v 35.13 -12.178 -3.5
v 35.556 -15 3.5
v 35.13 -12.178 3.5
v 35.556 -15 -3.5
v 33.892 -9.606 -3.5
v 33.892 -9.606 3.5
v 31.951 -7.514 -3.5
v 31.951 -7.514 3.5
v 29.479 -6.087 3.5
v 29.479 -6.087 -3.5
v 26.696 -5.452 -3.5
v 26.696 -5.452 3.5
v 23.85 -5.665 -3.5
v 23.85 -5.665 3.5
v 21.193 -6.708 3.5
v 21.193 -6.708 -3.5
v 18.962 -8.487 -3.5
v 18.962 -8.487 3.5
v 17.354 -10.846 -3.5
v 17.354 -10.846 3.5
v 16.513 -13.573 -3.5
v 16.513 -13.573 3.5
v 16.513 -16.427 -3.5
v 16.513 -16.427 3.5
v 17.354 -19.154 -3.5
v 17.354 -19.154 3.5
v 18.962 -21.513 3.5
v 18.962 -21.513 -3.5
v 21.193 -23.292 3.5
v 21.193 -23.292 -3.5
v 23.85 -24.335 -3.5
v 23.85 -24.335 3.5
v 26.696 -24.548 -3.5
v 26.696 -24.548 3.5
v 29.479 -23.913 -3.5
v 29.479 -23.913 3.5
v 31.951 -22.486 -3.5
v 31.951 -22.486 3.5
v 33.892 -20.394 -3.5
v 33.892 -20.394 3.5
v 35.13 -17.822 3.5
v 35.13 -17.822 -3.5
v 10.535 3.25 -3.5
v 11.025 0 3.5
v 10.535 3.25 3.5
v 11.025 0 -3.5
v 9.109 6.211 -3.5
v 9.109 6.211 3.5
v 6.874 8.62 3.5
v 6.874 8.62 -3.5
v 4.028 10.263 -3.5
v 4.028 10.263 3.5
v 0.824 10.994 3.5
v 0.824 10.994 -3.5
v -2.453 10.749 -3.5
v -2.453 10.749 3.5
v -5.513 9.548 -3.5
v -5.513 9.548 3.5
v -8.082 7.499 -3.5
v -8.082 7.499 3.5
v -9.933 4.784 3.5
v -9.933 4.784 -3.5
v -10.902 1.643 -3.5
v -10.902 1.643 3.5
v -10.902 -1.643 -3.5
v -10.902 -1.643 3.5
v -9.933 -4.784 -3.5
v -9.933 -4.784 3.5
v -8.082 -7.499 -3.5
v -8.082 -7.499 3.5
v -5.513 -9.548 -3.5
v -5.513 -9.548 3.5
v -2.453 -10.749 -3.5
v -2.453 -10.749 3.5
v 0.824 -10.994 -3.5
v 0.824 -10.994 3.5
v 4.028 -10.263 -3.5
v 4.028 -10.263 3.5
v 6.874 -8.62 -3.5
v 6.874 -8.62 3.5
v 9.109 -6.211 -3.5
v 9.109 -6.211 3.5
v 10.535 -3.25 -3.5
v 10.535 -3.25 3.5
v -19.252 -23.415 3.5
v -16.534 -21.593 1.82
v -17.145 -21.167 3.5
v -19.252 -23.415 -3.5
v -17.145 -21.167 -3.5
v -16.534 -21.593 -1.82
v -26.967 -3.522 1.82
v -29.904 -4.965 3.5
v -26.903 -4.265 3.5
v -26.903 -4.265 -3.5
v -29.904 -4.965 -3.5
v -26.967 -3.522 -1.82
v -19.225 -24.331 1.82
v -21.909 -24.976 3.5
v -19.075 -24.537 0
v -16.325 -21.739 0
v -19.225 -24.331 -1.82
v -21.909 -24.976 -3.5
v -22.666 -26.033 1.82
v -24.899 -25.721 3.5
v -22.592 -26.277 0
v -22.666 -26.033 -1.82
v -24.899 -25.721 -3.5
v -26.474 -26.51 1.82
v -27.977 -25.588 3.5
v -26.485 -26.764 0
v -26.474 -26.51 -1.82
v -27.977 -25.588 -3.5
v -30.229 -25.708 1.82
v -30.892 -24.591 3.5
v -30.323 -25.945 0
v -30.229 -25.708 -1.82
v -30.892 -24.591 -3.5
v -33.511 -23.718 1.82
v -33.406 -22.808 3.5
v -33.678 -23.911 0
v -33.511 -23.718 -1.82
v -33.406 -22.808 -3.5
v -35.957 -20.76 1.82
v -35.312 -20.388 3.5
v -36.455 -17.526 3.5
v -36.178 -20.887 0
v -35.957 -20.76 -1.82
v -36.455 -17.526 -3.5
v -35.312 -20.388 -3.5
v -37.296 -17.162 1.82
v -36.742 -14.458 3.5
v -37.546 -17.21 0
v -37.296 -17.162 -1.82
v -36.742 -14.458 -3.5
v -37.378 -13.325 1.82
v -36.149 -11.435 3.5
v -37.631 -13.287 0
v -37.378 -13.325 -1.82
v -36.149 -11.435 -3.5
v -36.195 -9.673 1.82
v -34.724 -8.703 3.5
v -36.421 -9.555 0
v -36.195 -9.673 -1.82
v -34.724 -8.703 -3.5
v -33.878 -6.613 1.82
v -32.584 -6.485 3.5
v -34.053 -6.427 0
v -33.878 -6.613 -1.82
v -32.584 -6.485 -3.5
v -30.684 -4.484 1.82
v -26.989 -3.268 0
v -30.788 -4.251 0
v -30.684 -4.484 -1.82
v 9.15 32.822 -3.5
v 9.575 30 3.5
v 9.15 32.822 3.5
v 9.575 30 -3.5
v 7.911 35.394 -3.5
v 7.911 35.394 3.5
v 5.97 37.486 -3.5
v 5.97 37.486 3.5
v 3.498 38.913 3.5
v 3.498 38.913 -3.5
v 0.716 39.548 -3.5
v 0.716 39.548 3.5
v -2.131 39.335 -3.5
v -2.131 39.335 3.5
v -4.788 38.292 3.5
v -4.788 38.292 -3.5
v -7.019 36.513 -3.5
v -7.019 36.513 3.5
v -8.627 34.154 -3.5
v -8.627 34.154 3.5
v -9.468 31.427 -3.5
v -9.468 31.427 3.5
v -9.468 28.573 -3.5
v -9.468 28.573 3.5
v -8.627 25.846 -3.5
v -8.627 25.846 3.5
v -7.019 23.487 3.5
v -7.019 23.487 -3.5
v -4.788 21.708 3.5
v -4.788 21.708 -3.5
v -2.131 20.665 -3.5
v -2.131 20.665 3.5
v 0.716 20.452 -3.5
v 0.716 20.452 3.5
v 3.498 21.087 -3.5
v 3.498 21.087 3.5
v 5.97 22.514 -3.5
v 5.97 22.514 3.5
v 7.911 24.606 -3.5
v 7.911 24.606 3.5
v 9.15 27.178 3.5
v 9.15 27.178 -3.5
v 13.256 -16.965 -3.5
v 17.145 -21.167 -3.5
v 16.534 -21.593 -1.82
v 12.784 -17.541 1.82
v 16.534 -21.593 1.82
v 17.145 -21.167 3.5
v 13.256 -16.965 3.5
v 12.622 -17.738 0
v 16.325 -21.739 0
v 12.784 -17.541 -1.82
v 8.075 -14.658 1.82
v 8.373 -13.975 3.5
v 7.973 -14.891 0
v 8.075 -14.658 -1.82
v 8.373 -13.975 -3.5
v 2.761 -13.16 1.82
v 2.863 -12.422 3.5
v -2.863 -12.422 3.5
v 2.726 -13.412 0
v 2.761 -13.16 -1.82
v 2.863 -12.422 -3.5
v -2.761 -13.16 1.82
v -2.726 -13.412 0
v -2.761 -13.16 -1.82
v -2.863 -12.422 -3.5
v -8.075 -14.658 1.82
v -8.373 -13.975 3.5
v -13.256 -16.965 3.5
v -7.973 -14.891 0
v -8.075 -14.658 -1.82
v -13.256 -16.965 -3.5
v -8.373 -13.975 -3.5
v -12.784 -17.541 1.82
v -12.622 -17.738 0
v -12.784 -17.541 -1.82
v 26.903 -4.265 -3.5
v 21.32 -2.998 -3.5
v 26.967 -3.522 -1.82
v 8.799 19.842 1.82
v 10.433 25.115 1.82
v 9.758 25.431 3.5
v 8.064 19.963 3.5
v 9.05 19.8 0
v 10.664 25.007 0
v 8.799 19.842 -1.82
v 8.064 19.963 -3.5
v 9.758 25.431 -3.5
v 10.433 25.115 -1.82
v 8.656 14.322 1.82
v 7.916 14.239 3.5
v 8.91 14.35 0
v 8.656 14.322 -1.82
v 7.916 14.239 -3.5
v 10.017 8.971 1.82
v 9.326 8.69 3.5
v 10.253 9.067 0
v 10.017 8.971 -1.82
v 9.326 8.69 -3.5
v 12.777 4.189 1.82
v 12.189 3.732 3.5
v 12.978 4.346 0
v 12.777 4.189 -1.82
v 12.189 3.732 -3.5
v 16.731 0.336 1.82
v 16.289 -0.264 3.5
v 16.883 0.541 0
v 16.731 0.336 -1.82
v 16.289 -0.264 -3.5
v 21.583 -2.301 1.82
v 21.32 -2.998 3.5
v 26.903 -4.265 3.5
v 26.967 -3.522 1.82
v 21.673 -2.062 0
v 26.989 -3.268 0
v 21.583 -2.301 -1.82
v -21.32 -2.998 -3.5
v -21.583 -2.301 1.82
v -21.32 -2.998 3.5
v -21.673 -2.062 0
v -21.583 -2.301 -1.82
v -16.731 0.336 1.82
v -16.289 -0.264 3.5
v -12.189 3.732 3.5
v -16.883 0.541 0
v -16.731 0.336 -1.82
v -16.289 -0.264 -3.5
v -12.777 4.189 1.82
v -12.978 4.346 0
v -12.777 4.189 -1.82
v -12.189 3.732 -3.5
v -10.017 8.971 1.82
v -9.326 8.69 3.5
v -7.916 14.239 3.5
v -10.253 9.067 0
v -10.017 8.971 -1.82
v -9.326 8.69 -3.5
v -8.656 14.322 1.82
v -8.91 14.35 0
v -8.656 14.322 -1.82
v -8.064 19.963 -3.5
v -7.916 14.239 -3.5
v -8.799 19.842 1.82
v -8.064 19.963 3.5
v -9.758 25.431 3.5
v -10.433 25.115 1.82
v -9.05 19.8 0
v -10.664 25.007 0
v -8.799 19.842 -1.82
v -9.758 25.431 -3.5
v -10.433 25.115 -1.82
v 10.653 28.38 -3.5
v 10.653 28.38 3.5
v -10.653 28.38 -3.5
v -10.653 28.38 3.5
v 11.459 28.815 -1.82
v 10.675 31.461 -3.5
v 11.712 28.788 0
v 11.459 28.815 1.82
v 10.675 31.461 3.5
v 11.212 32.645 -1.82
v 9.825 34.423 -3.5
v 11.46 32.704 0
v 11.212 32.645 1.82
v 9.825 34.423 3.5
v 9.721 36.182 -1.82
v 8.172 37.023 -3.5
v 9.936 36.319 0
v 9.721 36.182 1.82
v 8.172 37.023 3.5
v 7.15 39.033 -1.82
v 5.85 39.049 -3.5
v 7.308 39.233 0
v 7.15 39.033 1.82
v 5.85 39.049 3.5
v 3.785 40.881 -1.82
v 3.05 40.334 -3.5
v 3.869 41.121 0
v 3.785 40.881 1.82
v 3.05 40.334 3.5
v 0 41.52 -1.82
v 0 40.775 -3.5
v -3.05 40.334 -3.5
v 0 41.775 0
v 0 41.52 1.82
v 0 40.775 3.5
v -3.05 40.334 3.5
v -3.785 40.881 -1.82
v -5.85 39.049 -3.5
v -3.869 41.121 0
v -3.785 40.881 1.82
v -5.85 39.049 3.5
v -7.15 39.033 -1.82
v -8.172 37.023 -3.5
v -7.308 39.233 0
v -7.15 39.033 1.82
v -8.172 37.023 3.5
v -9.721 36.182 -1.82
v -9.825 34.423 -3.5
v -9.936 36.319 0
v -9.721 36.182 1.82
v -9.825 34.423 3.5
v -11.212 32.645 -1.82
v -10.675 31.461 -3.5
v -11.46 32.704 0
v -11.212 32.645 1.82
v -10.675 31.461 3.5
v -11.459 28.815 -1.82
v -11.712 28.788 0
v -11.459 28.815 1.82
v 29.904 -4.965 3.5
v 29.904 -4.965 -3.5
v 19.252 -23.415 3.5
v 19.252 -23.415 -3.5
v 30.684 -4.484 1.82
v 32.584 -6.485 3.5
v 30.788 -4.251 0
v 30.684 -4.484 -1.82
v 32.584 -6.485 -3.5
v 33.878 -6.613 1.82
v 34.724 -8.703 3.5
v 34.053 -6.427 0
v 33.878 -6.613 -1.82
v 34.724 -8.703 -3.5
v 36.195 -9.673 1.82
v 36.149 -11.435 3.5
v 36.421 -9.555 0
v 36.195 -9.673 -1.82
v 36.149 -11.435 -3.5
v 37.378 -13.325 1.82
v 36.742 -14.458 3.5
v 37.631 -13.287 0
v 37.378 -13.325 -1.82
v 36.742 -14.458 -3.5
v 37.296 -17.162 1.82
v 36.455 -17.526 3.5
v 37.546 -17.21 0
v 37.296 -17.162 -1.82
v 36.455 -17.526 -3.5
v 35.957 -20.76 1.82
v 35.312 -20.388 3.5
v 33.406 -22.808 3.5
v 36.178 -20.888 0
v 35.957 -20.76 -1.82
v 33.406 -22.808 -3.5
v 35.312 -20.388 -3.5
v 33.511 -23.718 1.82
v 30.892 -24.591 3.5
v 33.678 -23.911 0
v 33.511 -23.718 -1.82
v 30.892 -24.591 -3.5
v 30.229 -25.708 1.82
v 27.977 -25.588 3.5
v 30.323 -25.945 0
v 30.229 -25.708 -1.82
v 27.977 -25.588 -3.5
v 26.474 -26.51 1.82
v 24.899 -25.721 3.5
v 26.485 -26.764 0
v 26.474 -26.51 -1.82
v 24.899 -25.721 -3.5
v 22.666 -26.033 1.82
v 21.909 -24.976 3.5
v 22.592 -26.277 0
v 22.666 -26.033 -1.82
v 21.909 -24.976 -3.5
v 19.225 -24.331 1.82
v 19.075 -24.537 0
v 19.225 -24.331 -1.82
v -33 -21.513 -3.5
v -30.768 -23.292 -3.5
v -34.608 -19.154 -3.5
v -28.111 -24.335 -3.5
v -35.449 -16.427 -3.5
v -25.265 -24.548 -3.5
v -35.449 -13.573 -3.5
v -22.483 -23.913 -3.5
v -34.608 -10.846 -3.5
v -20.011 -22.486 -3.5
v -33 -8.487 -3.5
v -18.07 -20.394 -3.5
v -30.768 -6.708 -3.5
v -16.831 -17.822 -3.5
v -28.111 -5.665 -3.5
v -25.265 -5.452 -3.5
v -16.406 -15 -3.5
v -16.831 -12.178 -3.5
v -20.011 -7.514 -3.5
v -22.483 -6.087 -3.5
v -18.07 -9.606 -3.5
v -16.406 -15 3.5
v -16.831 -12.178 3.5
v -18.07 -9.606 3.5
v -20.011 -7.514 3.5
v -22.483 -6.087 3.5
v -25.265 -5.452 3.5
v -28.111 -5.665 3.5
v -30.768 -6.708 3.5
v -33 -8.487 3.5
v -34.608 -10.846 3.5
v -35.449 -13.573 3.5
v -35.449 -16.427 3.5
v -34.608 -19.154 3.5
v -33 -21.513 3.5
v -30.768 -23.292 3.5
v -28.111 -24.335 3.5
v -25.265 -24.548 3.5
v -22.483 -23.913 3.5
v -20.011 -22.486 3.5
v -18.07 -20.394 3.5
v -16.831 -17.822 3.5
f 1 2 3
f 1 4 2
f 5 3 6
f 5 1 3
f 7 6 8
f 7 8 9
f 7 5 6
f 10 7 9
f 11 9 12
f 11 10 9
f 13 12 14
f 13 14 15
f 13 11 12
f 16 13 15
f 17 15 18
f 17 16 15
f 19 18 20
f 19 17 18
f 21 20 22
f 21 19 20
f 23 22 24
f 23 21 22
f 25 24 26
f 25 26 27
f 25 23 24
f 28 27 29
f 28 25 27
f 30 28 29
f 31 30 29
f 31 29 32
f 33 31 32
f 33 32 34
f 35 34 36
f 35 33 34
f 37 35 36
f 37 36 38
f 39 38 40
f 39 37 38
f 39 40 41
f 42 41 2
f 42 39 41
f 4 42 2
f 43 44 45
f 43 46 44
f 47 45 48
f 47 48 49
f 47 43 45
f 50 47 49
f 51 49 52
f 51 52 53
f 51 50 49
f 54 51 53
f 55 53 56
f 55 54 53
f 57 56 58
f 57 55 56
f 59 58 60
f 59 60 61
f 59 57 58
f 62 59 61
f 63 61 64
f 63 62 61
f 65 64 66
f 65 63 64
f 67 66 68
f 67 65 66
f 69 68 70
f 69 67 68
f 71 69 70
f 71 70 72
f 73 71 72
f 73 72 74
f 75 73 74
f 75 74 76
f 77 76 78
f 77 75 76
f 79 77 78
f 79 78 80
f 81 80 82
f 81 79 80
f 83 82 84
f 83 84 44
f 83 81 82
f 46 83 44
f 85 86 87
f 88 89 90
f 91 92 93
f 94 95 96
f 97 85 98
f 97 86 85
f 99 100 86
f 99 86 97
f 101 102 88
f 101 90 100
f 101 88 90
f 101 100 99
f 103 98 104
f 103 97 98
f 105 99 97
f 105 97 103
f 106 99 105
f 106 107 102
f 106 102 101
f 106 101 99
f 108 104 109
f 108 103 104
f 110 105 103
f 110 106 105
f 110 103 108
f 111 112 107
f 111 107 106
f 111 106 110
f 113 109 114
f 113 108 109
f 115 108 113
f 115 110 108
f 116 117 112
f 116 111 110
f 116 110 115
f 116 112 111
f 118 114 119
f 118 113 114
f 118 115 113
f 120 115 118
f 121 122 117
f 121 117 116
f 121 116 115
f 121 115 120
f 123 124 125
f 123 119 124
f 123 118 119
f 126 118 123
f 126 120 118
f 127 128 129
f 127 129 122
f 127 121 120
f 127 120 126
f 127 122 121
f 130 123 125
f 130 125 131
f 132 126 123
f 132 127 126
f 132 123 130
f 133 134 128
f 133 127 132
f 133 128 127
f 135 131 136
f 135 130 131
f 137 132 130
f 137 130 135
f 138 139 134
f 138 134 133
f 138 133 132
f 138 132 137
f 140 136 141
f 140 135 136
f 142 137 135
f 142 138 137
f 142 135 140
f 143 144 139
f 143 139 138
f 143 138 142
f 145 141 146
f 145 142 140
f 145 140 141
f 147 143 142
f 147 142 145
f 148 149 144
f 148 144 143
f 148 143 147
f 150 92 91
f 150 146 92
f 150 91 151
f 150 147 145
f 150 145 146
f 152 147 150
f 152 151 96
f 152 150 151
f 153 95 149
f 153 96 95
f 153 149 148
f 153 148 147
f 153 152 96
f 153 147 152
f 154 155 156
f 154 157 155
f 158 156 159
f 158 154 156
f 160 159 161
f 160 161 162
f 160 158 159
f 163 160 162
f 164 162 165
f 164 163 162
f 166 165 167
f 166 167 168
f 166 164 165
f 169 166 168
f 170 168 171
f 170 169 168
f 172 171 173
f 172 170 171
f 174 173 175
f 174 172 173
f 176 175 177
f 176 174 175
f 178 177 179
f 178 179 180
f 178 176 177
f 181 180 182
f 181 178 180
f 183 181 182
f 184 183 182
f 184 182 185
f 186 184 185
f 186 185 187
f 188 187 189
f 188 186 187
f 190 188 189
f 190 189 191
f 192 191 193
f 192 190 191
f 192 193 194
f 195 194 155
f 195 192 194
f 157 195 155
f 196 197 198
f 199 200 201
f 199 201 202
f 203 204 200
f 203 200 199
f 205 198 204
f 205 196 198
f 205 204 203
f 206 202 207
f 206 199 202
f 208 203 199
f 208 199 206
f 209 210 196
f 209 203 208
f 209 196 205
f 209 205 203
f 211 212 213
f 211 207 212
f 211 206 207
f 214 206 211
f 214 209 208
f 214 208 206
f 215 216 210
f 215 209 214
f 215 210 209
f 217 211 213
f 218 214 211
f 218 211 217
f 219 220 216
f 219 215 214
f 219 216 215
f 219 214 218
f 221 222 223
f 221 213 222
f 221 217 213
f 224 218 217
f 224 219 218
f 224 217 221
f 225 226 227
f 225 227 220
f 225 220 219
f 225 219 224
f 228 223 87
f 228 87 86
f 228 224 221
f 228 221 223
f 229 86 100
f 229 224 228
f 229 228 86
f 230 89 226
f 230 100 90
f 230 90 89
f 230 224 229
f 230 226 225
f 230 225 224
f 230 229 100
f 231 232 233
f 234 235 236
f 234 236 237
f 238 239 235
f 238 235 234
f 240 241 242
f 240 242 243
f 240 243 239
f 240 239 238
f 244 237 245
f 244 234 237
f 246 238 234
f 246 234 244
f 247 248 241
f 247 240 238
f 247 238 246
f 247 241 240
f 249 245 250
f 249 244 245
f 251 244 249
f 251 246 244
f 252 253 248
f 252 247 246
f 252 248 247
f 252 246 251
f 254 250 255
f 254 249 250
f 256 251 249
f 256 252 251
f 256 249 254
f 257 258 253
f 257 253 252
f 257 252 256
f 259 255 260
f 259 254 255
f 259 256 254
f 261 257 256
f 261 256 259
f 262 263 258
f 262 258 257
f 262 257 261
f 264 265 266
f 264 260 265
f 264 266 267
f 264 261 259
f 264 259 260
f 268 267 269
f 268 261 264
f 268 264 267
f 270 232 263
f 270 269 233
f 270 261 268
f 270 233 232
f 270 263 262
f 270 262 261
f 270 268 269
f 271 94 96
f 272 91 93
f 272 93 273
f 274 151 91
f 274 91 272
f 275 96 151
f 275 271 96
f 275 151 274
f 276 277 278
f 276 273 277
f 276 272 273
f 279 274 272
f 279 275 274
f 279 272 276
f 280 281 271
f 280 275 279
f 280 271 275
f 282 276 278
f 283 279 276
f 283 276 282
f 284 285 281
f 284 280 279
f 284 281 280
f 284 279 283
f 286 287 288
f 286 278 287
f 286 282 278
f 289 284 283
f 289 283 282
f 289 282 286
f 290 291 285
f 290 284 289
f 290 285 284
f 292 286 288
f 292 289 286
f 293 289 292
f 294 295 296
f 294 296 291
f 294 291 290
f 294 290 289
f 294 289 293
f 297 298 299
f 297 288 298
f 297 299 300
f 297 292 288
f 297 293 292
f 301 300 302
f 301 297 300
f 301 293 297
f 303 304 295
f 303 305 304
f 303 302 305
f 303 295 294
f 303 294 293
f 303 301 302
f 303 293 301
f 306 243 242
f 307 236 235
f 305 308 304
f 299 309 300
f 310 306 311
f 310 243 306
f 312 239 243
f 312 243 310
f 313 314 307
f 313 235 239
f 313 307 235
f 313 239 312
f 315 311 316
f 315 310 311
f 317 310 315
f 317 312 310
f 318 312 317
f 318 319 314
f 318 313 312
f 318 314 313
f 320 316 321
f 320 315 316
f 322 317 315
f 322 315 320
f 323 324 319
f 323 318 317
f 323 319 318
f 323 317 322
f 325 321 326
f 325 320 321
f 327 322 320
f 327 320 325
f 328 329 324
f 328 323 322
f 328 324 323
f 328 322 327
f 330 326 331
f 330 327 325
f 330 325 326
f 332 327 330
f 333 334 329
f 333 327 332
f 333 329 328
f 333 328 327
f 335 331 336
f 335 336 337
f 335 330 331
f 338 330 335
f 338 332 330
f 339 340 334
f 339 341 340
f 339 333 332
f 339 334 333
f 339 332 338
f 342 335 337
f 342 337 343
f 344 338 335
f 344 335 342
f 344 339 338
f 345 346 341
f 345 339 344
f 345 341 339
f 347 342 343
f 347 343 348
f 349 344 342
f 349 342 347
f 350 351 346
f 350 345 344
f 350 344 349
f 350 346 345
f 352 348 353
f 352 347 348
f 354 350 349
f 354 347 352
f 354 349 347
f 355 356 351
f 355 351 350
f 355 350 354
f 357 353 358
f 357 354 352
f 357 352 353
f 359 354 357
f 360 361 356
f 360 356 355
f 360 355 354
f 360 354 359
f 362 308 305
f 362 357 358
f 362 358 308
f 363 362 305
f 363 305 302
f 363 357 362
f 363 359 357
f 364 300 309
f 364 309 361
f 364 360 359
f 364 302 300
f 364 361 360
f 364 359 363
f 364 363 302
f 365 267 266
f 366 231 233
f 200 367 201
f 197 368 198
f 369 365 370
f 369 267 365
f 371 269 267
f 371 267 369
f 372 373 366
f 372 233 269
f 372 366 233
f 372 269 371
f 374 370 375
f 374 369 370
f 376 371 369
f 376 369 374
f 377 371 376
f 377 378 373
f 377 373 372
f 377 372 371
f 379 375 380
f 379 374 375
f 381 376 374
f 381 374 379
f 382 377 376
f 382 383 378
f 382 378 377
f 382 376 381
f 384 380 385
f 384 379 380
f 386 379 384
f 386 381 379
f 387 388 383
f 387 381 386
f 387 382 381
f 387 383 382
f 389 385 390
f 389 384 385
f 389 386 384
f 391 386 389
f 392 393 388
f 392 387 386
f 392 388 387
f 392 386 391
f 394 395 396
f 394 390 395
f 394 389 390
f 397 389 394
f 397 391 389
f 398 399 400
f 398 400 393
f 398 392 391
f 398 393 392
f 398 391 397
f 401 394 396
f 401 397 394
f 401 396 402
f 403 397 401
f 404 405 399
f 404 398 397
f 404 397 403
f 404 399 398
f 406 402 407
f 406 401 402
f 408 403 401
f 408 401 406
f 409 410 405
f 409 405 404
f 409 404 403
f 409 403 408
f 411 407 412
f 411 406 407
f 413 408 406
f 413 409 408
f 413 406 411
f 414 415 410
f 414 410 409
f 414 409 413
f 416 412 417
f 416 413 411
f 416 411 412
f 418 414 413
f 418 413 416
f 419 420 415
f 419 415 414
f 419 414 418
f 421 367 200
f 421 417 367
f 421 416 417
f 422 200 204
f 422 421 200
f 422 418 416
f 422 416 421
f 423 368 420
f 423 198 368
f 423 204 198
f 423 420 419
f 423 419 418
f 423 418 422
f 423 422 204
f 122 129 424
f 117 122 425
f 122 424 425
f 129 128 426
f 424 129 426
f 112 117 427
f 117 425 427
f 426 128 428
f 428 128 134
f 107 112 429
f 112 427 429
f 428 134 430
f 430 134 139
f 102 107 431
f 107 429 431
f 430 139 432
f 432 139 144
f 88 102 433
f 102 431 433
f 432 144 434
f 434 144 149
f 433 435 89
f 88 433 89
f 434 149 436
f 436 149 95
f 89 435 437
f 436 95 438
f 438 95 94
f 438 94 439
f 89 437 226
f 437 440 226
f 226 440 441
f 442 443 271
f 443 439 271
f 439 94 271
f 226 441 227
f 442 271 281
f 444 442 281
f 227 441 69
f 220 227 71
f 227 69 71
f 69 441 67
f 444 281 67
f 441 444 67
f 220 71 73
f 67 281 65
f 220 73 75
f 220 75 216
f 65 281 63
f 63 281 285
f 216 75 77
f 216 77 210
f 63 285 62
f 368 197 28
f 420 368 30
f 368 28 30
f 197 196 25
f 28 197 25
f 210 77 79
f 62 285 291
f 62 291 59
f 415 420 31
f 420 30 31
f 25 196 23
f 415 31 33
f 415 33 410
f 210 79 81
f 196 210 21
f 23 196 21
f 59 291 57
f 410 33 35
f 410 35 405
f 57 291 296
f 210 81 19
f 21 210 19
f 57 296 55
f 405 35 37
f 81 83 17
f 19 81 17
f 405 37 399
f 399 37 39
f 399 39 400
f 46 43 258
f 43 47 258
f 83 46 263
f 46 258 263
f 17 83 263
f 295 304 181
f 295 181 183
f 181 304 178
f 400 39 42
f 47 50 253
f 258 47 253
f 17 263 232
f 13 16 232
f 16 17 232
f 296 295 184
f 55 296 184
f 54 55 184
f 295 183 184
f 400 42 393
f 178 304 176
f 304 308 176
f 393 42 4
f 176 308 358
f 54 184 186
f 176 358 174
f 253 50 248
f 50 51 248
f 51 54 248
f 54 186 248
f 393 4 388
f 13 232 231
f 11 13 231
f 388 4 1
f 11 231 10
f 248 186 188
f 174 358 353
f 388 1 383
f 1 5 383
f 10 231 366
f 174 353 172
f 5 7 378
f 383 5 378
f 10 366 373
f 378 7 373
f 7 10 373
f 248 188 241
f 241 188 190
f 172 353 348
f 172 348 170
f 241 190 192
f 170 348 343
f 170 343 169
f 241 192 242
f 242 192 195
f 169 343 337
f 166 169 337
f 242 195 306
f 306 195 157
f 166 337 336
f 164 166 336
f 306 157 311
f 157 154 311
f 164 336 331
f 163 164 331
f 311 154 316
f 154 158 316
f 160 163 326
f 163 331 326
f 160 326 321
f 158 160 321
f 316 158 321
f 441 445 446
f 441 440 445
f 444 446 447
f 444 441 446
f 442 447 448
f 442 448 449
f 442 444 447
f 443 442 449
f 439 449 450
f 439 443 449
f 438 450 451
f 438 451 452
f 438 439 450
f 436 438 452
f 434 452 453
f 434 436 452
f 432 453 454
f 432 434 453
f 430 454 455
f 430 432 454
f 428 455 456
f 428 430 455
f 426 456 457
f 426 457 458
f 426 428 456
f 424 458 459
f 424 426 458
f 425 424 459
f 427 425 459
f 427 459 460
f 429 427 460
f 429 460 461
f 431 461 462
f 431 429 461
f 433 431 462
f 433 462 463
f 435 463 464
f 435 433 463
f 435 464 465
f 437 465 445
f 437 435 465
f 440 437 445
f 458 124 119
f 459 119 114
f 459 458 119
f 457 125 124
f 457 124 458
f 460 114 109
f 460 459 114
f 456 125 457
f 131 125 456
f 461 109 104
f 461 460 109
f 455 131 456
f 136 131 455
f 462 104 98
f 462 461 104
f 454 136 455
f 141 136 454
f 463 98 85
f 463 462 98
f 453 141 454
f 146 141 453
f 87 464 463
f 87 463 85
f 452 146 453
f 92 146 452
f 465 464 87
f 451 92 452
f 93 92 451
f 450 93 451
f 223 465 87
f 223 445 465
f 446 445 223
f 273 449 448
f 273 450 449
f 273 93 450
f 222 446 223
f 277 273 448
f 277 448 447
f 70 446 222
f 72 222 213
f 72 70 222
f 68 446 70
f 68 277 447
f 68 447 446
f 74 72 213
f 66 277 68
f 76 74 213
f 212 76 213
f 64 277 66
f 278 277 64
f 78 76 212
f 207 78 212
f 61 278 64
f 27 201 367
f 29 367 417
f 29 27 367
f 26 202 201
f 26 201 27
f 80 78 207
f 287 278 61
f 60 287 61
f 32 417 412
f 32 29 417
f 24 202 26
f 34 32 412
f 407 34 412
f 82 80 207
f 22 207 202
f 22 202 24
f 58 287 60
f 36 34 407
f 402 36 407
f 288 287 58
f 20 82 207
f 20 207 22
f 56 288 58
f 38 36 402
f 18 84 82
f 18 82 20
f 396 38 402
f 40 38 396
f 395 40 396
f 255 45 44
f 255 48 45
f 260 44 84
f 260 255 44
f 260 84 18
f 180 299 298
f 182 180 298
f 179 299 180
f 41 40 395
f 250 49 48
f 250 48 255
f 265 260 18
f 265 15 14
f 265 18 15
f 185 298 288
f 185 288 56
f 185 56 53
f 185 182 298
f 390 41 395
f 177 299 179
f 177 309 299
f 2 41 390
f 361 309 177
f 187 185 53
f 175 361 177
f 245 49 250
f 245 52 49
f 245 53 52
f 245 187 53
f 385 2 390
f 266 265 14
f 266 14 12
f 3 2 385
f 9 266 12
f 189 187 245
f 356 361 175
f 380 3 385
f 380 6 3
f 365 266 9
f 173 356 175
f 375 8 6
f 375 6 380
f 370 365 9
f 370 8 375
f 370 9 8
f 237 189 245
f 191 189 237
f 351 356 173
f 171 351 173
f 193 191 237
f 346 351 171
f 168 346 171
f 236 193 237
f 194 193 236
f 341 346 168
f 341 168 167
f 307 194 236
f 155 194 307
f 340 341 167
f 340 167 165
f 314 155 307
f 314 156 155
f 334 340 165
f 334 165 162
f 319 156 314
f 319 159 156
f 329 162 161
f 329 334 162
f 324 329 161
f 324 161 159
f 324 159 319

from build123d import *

# Parameters (mm, degrees)
F0_R     = 9.575
F0_R_2   = 11.025
F1_DEPTH = 3.5


# Not quite as in the source:
# - a feature names something its author has since deleted; it is built from what else it names


with BuildPart() as f1:
    # F0 (on Top) → F1 (new body, symmetric)
    with BuildSketch(Plane.XY):
        with BuildLine():
            ThreePointArc((-9.7584878157, 25.4313524375), (-10.5871605613, 6.1125), (-26.9034411714, -4.2645778678))
            ThreePointArc((-26.9034411714, -4.2645778678), (-35.3121858393, -20.3875), (-17.1449533556, -21.1667745697))
            ThreePointArc((-17.1449533556, -21.1667745697), (0, -12.225), (17.1449533556, -21.1667745697))
            ThreePointArc((17.1449533556, -21.1667745697), (35.3121858393, -20.3875), (26.9034411714, -4.2645778678))
            ThreePointArc((26.9034411714, -4.2645778678), (10.5871605613, 6.1125), (9.7584878157, 25.4313524375))
            ThreePointArc((9.7584878157, 25.4313524375), (0, 40.775), (-9.7584878157, 25.4313524375))
        make_face()
        with Locations((-25.9807621135, -15)):
            Circle(F0_R, mode=Mode.SUBTRACT)
        Circle(F0_R_2, mode=Mode.SUBTRACT)
        with Locations((25.9807621135, -15)):
            Circle(F0_R, mode=Mode.SUBTRACT)
        with Locations((0, 30)):
            Circle(F0_R, mode=Mode.SUBTRACT)
    extrude(amount=F1_DEPTH, both=True)

    # F4: sweep along a path in F0
    with BuildLine(Plane.XY) as f4_path:
        ThreePointArc((9.7584878157, 25.4313524375), (0, 40.775), (-9.7584878157, 25.4313524375))
    # F3 (on line) → F4 (sweep)
    with BuildSketch(Plane(origin=(11.5201166848, 24.6066077034, 0), x_dir=(-0.9056601221, 0.4240044141, 0), z_dir=(0.4240044141, 0.9056601221, 0))):
        with BuildLine():
            ThreePointArc((1.9451324245, 3.5), (0.9451324245, 0), (1.9451324245, -3.5))
            Line((1.9451324245, -3.5), (1.9451324245, 3.5))
        make_face()
    sweep(path=f4_path.line)

    # F5: sweep along a path in F0
    with BuildLine(Plane.XY) as f5_path:
        ThreePointArc((9.7584878157, 25.4313524375), (10.5871605613, 6.1125), (26.9034411714, -4.2645778678))
        ThreePointArc((26.9034411714, -4.2645778678), (35.3121858393, -20.3875), (17.1449533556, -21.1667745697))
        ThreePointArc((17.1449533556, -21.1667745697), (0, -12.225), (-17.1449533556, -21.1667745697))
        ThreePointArc((-17.1449533556, -21.1667745697), (-35.3121858393, -20.3875), (-26.9034411714, -4.2645778678))
        ThreePointArc((-26.9034411714, -4.2645778678), (-10.5871605613, 6.1125), (-9.7584878157, 25.4313524375))
    # F4_face (on face) → F5 (sweep)
    with BuildSketch(Plane(origin=(10.1232025909, 25.2606033113, 0), x_dir=(0.9056601221, -0.4240044141, 0), z_dir=(-0.4240044141, -0.9056601221, 0))):
        with BuildLine():
            ThreePointArc((-0.402706011, -3.5), (0.597293989, 0), (-0.402706011, 3.5))
            Line((-0.402706011, 3.5), (-0.402706011, -3.5))
        make_face()
    sweep(path=f5_path.line)


solid = f1.part
